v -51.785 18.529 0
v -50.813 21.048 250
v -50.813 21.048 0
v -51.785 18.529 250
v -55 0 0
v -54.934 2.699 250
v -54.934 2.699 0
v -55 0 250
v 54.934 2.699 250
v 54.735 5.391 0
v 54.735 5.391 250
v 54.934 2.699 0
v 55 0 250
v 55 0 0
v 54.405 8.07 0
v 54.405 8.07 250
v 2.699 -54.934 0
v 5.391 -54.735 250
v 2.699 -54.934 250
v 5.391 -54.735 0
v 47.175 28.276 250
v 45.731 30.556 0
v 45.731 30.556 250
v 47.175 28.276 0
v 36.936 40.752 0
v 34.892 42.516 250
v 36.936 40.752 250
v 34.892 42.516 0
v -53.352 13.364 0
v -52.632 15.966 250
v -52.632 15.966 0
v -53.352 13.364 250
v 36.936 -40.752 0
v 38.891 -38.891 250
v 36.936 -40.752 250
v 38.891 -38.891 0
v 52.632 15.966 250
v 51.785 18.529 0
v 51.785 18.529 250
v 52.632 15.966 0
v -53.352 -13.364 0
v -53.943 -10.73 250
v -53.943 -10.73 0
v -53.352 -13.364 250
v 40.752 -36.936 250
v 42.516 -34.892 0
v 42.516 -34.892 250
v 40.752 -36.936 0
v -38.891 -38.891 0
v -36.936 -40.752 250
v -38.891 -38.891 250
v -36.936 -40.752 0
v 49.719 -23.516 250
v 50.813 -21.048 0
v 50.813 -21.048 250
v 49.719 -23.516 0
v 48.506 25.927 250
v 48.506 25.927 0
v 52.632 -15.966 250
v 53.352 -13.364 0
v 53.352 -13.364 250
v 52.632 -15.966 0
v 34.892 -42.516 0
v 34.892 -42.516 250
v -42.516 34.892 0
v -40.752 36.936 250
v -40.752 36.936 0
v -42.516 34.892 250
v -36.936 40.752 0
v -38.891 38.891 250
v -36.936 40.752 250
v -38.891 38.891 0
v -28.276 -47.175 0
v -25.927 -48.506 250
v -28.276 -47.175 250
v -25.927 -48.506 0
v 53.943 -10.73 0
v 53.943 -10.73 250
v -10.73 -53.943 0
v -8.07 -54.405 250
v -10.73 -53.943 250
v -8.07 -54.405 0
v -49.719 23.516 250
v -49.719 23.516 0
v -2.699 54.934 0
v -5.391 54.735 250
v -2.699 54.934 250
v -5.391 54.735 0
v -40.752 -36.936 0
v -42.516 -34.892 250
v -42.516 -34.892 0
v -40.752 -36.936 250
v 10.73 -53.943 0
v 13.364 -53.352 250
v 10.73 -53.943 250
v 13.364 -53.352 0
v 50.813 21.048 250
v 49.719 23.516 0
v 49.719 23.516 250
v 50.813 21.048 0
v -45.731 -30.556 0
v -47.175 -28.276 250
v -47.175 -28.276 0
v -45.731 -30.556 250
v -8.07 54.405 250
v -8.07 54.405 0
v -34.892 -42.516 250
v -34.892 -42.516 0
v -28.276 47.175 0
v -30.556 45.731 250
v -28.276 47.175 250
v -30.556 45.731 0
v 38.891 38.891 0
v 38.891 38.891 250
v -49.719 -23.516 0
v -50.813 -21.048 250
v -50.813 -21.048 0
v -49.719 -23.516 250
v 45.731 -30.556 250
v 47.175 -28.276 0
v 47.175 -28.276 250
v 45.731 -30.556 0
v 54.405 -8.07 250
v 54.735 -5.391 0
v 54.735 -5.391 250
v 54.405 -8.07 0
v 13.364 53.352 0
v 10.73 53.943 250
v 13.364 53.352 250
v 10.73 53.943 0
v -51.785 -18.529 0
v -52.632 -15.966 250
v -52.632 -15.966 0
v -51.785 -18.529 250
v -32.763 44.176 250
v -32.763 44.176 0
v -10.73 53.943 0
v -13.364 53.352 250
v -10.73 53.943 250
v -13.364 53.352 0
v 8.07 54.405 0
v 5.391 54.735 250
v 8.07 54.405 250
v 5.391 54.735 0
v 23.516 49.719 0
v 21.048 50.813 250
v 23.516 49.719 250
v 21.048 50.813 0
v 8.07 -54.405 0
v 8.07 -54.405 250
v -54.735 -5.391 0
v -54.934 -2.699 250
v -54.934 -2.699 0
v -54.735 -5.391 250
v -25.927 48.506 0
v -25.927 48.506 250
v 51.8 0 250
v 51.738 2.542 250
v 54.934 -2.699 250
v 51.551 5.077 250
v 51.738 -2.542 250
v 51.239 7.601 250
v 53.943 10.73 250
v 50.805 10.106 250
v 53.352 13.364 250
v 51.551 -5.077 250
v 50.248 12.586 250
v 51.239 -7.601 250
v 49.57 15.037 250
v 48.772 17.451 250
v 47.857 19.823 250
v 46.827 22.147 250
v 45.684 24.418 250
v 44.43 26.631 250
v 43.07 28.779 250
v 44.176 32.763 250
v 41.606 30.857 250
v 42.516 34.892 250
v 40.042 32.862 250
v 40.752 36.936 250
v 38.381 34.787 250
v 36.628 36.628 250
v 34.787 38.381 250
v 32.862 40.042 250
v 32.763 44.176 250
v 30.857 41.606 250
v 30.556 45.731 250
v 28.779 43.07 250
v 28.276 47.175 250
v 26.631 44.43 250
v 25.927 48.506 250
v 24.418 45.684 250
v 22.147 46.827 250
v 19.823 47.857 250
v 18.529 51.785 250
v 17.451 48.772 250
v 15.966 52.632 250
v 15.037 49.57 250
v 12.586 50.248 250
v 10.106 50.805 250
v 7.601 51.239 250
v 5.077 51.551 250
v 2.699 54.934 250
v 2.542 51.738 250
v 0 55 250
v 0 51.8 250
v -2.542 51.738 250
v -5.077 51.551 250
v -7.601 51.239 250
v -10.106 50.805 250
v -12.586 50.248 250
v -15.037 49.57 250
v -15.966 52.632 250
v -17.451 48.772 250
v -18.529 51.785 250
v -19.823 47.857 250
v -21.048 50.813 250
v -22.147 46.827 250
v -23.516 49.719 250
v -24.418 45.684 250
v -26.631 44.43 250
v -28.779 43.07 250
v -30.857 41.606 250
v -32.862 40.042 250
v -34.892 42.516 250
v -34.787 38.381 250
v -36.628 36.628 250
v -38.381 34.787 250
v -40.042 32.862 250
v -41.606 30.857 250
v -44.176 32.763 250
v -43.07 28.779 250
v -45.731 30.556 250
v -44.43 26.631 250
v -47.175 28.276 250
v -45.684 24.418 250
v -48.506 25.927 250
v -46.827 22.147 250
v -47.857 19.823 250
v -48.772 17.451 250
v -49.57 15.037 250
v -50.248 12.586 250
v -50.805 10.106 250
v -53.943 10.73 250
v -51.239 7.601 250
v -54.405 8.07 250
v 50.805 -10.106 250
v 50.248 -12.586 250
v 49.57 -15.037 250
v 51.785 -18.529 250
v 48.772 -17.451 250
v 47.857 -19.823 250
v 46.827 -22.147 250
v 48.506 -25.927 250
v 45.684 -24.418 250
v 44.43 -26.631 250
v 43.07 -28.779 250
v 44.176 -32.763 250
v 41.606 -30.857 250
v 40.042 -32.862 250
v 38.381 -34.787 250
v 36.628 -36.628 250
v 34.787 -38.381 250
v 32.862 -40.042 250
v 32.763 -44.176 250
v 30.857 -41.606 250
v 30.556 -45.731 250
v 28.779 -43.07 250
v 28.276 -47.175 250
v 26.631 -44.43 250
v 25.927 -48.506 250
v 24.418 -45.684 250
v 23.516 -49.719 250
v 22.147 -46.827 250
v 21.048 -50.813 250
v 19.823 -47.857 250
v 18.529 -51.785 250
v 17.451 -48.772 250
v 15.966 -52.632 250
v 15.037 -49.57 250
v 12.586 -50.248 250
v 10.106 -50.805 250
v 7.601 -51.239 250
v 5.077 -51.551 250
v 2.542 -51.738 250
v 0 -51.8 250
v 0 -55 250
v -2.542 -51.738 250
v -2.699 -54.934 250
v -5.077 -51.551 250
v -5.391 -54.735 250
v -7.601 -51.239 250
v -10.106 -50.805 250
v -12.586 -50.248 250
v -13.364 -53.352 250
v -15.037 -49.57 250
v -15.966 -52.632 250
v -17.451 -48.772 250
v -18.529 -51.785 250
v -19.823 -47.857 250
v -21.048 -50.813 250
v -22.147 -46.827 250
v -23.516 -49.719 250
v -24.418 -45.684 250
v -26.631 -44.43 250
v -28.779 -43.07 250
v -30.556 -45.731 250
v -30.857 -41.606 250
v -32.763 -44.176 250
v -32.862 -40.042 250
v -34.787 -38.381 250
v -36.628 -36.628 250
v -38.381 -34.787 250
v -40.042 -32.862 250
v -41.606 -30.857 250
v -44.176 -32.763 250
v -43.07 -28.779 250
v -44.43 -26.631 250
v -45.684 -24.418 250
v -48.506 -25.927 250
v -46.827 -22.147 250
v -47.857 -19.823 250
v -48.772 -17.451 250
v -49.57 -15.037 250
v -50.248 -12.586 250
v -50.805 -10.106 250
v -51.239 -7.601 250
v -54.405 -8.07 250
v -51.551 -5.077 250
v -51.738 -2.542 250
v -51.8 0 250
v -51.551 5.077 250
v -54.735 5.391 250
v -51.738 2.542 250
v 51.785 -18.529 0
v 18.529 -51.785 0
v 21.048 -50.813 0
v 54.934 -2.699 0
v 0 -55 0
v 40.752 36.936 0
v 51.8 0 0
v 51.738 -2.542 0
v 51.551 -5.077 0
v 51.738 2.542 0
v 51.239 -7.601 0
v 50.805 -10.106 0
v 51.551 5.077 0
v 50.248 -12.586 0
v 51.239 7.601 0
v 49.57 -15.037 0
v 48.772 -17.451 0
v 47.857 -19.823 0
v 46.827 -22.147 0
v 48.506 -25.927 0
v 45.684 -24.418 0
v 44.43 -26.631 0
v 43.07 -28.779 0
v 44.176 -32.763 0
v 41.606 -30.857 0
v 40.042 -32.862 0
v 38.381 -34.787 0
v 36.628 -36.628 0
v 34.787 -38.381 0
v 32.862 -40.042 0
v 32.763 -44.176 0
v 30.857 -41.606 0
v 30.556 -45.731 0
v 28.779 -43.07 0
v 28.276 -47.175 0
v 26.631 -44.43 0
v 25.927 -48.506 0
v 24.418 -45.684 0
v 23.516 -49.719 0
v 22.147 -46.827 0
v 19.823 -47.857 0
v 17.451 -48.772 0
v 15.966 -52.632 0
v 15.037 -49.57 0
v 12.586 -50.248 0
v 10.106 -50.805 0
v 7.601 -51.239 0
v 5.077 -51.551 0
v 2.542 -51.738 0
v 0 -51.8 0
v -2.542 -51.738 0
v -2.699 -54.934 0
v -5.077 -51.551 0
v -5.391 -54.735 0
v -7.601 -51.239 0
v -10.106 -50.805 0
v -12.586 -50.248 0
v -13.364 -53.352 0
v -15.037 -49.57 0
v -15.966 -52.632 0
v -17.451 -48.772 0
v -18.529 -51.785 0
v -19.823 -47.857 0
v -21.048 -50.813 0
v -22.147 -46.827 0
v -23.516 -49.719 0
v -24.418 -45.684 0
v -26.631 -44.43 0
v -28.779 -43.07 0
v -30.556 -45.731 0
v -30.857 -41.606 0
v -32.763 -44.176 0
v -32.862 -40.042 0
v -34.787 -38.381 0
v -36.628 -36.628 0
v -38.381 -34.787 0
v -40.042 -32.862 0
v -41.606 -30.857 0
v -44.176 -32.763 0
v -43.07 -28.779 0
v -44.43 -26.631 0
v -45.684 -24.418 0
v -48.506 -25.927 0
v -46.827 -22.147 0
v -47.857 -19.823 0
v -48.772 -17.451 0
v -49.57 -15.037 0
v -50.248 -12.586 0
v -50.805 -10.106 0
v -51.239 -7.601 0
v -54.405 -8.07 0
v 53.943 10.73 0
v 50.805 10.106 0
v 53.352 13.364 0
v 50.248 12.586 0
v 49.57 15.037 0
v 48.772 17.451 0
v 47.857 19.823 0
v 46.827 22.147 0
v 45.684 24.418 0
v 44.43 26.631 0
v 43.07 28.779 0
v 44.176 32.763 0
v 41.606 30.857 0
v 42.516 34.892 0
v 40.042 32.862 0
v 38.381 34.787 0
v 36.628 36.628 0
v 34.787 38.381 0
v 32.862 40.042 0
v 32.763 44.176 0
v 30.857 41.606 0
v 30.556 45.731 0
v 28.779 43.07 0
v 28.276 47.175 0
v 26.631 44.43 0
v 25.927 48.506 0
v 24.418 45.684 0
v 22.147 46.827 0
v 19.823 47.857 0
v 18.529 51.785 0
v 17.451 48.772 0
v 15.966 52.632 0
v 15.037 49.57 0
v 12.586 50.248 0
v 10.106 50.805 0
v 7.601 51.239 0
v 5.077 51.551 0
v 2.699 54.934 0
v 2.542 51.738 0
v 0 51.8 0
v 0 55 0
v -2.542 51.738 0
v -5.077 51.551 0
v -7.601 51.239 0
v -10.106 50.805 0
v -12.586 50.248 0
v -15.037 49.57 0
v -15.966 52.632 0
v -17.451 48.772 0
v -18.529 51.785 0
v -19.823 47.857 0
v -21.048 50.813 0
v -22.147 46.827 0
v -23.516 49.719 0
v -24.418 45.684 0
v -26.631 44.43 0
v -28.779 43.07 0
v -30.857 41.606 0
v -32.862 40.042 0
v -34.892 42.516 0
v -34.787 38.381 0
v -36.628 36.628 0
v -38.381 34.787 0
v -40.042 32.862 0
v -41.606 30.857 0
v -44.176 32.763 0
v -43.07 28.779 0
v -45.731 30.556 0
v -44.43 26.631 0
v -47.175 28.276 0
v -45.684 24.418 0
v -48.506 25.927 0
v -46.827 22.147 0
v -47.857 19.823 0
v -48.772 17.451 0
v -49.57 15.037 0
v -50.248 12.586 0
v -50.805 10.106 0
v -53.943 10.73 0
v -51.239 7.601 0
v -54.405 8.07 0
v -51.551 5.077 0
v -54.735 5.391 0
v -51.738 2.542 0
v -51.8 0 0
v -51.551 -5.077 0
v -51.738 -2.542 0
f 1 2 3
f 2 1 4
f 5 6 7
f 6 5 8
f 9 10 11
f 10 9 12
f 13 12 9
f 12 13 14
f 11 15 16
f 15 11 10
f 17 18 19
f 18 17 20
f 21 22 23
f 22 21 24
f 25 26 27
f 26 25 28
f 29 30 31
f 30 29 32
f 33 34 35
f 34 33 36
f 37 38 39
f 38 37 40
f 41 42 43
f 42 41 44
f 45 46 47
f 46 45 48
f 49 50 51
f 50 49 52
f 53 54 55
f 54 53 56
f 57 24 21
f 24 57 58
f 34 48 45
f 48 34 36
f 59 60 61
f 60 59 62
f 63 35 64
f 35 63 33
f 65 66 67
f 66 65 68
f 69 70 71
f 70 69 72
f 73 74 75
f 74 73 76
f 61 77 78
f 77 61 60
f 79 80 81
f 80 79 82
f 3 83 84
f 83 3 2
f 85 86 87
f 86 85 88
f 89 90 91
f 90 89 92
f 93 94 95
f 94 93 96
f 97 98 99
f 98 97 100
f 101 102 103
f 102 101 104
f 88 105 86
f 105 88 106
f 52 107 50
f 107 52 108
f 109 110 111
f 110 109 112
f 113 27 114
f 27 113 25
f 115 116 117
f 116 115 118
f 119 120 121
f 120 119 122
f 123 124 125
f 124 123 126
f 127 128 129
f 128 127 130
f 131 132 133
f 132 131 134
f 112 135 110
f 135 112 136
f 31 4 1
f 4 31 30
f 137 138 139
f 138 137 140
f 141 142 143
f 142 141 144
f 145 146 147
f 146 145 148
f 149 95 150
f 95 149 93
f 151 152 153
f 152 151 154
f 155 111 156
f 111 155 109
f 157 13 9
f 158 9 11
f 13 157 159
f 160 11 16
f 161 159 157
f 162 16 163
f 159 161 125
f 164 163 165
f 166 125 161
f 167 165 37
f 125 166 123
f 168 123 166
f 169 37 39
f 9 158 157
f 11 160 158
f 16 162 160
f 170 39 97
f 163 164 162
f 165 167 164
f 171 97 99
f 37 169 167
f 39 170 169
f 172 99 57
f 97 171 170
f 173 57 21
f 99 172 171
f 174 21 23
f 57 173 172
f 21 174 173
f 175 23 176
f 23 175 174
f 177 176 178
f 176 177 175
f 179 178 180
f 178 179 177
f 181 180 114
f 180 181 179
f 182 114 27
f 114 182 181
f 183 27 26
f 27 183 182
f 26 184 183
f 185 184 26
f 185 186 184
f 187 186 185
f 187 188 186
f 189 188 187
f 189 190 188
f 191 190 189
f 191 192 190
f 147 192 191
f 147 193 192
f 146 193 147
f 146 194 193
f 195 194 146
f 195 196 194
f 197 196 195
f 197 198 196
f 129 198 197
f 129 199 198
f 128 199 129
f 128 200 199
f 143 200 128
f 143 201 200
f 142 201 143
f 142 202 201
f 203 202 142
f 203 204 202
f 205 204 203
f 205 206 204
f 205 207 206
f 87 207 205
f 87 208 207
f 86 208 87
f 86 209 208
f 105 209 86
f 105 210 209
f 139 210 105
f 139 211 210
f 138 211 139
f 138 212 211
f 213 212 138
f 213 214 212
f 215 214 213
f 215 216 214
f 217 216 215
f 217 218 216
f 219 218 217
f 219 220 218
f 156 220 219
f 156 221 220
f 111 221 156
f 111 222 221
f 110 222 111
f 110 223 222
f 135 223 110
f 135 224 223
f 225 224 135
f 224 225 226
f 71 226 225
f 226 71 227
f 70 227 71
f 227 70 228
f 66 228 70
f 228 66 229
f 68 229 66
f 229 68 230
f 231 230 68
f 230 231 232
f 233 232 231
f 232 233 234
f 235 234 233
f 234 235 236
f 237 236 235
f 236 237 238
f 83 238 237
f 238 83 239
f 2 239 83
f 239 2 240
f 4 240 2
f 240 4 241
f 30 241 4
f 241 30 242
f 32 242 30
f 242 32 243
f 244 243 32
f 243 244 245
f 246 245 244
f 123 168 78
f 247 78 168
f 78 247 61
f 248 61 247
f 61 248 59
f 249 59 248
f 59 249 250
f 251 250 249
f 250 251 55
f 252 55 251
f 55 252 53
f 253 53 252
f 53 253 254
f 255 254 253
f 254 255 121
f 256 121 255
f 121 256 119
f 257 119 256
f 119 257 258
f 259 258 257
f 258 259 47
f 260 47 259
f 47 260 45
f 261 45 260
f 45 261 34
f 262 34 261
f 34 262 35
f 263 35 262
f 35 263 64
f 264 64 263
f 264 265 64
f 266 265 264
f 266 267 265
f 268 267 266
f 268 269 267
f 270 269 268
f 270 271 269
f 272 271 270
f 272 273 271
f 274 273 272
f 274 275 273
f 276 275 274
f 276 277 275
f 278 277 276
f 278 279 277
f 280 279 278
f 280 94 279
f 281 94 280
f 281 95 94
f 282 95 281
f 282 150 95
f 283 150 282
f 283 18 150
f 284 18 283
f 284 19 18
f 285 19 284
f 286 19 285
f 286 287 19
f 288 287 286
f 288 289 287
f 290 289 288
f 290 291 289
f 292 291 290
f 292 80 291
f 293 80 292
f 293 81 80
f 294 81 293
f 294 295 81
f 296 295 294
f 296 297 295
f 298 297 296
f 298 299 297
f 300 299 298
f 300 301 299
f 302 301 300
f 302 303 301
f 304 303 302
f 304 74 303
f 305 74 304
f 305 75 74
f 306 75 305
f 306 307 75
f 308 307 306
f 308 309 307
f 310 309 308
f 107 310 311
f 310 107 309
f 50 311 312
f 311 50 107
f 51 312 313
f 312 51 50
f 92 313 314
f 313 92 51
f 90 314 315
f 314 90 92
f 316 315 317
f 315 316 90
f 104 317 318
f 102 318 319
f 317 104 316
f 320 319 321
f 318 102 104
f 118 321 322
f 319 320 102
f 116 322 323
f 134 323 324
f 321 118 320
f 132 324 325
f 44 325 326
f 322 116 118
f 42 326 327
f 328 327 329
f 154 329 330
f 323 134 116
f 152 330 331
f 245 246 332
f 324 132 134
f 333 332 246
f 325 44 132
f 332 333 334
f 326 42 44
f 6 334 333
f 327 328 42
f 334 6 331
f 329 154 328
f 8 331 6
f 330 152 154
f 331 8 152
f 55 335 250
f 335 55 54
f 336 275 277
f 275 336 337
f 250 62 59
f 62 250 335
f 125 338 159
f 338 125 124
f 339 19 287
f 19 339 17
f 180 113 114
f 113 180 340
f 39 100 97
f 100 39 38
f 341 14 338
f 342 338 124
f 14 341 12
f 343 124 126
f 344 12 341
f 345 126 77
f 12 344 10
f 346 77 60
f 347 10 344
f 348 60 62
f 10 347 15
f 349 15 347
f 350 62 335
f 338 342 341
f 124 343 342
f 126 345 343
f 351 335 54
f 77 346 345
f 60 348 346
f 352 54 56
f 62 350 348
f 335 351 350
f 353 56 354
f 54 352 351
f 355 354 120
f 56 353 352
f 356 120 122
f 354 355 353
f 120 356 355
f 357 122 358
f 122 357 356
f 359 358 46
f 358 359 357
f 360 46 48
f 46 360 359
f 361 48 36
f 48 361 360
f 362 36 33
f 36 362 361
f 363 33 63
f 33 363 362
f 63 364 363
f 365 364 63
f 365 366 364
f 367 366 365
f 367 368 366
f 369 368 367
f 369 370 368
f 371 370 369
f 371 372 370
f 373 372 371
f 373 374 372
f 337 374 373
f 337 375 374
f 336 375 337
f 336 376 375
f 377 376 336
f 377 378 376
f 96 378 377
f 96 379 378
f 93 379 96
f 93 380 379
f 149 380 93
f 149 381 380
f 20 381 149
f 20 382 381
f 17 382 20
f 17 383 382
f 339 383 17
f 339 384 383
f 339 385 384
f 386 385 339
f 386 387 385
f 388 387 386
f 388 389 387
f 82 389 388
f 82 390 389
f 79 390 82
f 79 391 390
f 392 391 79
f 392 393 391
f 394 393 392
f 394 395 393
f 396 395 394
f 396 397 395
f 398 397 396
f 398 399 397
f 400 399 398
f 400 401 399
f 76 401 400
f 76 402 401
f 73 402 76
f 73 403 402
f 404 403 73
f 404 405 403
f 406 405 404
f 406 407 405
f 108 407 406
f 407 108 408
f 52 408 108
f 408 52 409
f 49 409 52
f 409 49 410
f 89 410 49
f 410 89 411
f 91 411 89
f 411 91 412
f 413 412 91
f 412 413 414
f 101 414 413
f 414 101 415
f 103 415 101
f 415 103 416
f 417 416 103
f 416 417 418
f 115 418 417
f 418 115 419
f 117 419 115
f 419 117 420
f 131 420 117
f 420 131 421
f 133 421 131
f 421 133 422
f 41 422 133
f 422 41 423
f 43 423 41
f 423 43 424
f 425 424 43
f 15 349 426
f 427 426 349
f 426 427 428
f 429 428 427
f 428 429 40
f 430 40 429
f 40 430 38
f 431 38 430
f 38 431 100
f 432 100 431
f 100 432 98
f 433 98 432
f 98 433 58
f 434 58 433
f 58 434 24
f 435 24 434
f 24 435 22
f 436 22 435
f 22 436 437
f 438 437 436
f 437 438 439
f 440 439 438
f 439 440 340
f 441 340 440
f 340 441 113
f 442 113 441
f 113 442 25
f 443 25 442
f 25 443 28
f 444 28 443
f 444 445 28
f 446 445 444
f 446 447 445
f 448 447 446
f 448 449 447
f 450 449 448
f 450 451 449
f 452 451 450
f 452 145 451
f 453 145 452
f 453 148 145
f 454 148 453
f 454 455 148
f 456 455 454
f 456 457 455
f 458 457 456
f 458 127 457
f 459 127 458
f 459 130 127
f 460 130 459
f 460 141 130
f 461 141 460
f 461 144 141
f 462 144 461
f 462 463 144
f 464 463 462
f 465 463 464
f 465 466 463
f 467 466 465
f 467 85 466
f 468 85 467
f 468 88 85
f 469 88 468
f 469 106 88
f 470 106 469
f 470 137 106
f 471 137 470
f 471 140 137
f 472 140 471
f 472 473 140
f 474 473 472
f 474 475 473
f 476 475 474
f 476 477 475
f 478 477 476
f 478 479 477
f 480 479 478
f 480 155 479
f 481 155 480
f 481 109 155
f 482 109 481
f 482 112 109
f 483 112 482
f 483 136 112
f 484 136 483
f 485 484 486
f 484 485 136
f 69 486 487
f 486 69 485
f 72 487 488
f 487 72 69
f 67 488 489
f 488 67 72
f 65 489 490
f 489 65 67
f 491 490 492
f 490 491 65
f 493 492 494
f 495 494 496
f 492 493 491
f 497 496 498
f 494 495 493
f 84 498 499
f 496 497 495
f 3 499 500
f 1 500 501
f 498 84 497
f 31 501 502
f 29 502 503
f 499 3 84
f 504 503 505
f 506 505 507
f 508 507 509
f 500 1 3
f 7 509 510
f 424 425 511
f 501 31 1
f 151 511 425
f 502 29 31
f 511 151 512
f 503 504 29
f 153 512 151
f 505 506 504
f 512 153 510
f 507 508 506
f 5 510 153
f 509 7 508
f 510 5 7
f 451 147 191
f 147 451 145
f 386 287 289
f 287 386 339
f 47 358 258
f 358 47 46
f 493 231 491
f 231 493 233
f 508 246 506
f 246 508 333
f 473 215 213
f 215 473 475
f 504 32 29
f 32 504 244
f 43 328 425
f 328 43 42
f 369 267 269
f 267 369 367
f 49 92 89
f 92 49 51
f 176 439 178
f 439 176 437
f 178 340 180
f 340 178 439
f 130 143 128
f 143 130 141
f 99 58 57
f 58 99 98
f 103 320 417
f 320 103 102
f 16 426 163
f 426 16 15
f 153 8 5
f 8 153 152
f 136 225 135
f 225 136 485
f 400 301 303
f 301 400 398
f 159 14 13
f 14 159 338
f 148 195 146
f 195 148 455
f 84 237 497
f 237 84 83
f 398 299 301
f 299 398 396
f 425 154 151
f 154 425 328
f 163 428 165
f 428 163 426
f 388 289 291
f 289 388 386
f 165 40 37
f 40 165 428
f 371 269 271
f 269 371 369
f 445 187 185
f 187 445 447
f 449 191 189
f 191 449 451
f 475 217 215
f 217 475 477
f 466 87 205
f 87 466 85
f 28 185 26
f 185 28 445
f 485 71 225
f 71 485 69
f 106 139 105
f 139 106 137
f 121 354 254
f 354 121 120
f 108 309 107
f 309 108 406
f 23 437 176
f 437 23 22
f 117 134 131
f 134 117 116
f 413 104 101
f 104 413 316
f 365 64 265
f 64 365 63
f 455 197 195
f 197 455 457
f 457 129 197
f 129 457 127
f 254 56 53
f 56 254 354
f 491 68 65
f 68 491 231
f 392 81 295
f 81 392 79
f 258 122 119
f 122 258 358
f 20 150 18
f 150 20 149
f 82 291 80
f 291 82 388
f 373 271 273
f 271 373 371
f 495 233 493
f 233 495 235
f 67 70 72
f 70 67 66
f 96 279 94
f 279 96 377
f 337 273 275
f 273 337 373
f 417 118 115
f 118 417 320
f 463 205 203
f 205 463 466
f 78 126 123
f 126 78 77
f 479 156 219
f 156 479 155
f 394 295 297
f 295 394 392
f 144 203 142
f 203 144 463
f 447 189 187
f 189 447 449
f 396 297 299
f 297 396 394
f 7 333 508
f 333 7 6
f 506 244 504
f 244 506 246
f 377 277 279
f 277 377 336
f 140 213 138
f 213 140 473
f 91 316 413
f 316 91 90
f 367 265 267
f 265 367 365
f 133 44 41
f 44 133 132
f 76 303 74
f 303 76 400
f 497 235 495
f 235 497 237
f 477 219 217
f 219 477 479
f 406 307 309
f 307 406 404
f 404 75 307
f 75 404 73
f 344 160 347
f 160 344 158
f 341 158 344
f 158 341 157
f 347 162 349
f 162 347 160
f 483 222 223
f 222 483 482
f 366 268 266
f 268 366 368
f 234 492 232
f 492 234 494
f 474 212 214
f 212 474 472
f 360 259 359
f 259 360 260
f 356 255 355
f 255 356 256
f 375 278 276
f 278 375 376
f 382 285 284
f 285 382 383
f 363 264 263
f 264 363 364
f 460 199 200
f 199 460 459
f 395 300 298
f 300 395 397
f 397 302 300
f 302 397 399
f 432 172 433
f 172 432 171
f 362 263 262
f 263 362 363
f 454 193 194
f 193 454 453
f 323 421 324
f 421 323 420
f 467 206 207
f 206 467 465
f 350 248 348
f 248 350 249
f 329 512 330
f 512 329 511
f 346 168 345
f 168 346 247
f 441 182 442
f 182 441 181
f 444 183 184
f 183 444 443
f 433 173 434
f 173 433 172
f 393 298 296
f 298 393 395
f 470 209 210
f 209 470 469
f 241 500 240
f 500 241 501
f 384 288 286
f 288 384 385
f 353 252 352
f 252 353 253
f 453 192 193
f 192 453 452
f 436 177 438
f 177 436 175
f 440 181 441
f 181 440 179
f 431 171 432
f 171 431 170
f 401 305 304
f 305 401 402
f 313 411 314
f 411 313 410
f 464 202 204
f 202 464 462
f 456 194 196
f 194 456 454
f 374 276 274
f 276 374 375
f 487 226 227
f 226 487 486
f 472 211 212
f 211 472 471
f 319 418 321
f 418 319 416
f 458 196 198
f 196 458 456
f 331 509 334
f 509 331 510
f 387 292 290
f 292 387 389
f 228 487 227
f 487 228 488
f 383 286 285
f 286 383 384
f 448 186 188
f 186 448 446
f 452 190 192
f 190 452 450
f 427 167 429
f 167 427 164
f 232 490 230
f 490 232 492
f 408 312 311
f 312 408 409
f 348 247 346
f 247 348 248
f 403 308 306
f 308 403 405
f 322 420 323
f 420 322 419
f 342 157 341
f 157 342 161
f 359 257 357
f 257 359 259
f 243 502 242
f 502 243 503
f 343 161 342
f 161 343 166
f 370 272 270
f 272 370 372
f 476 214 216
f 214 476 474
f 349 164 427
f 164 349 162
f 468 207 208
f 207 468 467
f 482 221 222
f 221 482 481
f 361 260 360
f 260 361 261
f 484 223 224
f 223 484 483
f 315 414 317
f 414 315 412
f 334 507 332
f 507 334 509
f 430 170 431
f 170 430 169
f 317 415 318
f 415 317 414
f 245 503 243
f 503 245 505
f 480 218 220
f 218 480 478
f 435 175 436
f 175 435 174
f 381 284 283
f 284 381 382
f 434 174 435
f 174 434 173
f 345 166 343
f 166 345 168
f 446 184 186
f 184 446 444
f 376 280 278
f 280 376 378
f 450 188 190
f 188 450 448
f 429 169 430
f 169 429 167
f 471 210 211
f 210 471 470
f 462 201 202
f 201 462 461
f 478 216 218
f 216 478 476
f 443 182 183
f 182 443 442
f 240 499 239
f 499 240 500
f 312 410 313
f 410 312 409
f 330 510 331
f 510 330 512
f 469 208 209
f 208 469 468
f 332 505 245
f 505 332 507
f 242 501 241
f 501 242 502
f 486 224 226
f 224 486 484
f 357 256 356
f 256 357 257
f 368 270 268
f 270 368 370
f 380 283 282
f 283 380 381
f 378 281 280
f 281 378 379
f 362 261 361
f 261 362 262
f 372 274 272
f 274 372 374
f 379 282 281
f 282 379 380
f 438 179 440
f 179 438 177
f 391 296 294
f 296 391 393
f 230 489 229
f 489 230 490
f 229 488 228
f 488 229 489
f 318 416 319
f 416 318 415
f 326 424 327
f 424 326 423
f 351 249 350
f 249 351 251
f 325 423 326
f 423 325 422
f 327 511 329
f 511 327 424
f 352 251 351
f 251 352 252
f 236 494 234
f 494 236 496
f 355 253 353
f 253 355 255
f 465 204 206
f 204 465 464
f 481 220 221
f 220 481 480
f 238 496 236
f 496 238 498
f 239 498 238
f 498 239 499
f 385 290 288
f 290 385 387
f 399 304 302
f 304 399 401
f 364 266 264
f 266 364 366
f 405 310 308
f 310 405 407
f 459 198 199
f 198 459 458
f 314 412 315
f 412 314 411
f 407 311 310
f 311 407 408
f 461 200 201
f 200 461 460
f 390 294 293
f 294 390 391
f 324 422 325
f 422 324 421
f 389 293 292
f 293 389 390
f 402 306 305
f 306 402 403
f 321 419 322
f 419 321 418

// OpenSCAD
$fn = 128;

// HT 110 pipe (approx.): OD 110 mm, wall 3.2 mm, length 250 mm
od = 110;
wall = 3.2;
id = od - 2*wall;
len = 250;

difference() {
  cylinder(h = len, d = od);
  translate([0,0,-0.1]) cylinder(h = len + 0.2, d = id);
}
